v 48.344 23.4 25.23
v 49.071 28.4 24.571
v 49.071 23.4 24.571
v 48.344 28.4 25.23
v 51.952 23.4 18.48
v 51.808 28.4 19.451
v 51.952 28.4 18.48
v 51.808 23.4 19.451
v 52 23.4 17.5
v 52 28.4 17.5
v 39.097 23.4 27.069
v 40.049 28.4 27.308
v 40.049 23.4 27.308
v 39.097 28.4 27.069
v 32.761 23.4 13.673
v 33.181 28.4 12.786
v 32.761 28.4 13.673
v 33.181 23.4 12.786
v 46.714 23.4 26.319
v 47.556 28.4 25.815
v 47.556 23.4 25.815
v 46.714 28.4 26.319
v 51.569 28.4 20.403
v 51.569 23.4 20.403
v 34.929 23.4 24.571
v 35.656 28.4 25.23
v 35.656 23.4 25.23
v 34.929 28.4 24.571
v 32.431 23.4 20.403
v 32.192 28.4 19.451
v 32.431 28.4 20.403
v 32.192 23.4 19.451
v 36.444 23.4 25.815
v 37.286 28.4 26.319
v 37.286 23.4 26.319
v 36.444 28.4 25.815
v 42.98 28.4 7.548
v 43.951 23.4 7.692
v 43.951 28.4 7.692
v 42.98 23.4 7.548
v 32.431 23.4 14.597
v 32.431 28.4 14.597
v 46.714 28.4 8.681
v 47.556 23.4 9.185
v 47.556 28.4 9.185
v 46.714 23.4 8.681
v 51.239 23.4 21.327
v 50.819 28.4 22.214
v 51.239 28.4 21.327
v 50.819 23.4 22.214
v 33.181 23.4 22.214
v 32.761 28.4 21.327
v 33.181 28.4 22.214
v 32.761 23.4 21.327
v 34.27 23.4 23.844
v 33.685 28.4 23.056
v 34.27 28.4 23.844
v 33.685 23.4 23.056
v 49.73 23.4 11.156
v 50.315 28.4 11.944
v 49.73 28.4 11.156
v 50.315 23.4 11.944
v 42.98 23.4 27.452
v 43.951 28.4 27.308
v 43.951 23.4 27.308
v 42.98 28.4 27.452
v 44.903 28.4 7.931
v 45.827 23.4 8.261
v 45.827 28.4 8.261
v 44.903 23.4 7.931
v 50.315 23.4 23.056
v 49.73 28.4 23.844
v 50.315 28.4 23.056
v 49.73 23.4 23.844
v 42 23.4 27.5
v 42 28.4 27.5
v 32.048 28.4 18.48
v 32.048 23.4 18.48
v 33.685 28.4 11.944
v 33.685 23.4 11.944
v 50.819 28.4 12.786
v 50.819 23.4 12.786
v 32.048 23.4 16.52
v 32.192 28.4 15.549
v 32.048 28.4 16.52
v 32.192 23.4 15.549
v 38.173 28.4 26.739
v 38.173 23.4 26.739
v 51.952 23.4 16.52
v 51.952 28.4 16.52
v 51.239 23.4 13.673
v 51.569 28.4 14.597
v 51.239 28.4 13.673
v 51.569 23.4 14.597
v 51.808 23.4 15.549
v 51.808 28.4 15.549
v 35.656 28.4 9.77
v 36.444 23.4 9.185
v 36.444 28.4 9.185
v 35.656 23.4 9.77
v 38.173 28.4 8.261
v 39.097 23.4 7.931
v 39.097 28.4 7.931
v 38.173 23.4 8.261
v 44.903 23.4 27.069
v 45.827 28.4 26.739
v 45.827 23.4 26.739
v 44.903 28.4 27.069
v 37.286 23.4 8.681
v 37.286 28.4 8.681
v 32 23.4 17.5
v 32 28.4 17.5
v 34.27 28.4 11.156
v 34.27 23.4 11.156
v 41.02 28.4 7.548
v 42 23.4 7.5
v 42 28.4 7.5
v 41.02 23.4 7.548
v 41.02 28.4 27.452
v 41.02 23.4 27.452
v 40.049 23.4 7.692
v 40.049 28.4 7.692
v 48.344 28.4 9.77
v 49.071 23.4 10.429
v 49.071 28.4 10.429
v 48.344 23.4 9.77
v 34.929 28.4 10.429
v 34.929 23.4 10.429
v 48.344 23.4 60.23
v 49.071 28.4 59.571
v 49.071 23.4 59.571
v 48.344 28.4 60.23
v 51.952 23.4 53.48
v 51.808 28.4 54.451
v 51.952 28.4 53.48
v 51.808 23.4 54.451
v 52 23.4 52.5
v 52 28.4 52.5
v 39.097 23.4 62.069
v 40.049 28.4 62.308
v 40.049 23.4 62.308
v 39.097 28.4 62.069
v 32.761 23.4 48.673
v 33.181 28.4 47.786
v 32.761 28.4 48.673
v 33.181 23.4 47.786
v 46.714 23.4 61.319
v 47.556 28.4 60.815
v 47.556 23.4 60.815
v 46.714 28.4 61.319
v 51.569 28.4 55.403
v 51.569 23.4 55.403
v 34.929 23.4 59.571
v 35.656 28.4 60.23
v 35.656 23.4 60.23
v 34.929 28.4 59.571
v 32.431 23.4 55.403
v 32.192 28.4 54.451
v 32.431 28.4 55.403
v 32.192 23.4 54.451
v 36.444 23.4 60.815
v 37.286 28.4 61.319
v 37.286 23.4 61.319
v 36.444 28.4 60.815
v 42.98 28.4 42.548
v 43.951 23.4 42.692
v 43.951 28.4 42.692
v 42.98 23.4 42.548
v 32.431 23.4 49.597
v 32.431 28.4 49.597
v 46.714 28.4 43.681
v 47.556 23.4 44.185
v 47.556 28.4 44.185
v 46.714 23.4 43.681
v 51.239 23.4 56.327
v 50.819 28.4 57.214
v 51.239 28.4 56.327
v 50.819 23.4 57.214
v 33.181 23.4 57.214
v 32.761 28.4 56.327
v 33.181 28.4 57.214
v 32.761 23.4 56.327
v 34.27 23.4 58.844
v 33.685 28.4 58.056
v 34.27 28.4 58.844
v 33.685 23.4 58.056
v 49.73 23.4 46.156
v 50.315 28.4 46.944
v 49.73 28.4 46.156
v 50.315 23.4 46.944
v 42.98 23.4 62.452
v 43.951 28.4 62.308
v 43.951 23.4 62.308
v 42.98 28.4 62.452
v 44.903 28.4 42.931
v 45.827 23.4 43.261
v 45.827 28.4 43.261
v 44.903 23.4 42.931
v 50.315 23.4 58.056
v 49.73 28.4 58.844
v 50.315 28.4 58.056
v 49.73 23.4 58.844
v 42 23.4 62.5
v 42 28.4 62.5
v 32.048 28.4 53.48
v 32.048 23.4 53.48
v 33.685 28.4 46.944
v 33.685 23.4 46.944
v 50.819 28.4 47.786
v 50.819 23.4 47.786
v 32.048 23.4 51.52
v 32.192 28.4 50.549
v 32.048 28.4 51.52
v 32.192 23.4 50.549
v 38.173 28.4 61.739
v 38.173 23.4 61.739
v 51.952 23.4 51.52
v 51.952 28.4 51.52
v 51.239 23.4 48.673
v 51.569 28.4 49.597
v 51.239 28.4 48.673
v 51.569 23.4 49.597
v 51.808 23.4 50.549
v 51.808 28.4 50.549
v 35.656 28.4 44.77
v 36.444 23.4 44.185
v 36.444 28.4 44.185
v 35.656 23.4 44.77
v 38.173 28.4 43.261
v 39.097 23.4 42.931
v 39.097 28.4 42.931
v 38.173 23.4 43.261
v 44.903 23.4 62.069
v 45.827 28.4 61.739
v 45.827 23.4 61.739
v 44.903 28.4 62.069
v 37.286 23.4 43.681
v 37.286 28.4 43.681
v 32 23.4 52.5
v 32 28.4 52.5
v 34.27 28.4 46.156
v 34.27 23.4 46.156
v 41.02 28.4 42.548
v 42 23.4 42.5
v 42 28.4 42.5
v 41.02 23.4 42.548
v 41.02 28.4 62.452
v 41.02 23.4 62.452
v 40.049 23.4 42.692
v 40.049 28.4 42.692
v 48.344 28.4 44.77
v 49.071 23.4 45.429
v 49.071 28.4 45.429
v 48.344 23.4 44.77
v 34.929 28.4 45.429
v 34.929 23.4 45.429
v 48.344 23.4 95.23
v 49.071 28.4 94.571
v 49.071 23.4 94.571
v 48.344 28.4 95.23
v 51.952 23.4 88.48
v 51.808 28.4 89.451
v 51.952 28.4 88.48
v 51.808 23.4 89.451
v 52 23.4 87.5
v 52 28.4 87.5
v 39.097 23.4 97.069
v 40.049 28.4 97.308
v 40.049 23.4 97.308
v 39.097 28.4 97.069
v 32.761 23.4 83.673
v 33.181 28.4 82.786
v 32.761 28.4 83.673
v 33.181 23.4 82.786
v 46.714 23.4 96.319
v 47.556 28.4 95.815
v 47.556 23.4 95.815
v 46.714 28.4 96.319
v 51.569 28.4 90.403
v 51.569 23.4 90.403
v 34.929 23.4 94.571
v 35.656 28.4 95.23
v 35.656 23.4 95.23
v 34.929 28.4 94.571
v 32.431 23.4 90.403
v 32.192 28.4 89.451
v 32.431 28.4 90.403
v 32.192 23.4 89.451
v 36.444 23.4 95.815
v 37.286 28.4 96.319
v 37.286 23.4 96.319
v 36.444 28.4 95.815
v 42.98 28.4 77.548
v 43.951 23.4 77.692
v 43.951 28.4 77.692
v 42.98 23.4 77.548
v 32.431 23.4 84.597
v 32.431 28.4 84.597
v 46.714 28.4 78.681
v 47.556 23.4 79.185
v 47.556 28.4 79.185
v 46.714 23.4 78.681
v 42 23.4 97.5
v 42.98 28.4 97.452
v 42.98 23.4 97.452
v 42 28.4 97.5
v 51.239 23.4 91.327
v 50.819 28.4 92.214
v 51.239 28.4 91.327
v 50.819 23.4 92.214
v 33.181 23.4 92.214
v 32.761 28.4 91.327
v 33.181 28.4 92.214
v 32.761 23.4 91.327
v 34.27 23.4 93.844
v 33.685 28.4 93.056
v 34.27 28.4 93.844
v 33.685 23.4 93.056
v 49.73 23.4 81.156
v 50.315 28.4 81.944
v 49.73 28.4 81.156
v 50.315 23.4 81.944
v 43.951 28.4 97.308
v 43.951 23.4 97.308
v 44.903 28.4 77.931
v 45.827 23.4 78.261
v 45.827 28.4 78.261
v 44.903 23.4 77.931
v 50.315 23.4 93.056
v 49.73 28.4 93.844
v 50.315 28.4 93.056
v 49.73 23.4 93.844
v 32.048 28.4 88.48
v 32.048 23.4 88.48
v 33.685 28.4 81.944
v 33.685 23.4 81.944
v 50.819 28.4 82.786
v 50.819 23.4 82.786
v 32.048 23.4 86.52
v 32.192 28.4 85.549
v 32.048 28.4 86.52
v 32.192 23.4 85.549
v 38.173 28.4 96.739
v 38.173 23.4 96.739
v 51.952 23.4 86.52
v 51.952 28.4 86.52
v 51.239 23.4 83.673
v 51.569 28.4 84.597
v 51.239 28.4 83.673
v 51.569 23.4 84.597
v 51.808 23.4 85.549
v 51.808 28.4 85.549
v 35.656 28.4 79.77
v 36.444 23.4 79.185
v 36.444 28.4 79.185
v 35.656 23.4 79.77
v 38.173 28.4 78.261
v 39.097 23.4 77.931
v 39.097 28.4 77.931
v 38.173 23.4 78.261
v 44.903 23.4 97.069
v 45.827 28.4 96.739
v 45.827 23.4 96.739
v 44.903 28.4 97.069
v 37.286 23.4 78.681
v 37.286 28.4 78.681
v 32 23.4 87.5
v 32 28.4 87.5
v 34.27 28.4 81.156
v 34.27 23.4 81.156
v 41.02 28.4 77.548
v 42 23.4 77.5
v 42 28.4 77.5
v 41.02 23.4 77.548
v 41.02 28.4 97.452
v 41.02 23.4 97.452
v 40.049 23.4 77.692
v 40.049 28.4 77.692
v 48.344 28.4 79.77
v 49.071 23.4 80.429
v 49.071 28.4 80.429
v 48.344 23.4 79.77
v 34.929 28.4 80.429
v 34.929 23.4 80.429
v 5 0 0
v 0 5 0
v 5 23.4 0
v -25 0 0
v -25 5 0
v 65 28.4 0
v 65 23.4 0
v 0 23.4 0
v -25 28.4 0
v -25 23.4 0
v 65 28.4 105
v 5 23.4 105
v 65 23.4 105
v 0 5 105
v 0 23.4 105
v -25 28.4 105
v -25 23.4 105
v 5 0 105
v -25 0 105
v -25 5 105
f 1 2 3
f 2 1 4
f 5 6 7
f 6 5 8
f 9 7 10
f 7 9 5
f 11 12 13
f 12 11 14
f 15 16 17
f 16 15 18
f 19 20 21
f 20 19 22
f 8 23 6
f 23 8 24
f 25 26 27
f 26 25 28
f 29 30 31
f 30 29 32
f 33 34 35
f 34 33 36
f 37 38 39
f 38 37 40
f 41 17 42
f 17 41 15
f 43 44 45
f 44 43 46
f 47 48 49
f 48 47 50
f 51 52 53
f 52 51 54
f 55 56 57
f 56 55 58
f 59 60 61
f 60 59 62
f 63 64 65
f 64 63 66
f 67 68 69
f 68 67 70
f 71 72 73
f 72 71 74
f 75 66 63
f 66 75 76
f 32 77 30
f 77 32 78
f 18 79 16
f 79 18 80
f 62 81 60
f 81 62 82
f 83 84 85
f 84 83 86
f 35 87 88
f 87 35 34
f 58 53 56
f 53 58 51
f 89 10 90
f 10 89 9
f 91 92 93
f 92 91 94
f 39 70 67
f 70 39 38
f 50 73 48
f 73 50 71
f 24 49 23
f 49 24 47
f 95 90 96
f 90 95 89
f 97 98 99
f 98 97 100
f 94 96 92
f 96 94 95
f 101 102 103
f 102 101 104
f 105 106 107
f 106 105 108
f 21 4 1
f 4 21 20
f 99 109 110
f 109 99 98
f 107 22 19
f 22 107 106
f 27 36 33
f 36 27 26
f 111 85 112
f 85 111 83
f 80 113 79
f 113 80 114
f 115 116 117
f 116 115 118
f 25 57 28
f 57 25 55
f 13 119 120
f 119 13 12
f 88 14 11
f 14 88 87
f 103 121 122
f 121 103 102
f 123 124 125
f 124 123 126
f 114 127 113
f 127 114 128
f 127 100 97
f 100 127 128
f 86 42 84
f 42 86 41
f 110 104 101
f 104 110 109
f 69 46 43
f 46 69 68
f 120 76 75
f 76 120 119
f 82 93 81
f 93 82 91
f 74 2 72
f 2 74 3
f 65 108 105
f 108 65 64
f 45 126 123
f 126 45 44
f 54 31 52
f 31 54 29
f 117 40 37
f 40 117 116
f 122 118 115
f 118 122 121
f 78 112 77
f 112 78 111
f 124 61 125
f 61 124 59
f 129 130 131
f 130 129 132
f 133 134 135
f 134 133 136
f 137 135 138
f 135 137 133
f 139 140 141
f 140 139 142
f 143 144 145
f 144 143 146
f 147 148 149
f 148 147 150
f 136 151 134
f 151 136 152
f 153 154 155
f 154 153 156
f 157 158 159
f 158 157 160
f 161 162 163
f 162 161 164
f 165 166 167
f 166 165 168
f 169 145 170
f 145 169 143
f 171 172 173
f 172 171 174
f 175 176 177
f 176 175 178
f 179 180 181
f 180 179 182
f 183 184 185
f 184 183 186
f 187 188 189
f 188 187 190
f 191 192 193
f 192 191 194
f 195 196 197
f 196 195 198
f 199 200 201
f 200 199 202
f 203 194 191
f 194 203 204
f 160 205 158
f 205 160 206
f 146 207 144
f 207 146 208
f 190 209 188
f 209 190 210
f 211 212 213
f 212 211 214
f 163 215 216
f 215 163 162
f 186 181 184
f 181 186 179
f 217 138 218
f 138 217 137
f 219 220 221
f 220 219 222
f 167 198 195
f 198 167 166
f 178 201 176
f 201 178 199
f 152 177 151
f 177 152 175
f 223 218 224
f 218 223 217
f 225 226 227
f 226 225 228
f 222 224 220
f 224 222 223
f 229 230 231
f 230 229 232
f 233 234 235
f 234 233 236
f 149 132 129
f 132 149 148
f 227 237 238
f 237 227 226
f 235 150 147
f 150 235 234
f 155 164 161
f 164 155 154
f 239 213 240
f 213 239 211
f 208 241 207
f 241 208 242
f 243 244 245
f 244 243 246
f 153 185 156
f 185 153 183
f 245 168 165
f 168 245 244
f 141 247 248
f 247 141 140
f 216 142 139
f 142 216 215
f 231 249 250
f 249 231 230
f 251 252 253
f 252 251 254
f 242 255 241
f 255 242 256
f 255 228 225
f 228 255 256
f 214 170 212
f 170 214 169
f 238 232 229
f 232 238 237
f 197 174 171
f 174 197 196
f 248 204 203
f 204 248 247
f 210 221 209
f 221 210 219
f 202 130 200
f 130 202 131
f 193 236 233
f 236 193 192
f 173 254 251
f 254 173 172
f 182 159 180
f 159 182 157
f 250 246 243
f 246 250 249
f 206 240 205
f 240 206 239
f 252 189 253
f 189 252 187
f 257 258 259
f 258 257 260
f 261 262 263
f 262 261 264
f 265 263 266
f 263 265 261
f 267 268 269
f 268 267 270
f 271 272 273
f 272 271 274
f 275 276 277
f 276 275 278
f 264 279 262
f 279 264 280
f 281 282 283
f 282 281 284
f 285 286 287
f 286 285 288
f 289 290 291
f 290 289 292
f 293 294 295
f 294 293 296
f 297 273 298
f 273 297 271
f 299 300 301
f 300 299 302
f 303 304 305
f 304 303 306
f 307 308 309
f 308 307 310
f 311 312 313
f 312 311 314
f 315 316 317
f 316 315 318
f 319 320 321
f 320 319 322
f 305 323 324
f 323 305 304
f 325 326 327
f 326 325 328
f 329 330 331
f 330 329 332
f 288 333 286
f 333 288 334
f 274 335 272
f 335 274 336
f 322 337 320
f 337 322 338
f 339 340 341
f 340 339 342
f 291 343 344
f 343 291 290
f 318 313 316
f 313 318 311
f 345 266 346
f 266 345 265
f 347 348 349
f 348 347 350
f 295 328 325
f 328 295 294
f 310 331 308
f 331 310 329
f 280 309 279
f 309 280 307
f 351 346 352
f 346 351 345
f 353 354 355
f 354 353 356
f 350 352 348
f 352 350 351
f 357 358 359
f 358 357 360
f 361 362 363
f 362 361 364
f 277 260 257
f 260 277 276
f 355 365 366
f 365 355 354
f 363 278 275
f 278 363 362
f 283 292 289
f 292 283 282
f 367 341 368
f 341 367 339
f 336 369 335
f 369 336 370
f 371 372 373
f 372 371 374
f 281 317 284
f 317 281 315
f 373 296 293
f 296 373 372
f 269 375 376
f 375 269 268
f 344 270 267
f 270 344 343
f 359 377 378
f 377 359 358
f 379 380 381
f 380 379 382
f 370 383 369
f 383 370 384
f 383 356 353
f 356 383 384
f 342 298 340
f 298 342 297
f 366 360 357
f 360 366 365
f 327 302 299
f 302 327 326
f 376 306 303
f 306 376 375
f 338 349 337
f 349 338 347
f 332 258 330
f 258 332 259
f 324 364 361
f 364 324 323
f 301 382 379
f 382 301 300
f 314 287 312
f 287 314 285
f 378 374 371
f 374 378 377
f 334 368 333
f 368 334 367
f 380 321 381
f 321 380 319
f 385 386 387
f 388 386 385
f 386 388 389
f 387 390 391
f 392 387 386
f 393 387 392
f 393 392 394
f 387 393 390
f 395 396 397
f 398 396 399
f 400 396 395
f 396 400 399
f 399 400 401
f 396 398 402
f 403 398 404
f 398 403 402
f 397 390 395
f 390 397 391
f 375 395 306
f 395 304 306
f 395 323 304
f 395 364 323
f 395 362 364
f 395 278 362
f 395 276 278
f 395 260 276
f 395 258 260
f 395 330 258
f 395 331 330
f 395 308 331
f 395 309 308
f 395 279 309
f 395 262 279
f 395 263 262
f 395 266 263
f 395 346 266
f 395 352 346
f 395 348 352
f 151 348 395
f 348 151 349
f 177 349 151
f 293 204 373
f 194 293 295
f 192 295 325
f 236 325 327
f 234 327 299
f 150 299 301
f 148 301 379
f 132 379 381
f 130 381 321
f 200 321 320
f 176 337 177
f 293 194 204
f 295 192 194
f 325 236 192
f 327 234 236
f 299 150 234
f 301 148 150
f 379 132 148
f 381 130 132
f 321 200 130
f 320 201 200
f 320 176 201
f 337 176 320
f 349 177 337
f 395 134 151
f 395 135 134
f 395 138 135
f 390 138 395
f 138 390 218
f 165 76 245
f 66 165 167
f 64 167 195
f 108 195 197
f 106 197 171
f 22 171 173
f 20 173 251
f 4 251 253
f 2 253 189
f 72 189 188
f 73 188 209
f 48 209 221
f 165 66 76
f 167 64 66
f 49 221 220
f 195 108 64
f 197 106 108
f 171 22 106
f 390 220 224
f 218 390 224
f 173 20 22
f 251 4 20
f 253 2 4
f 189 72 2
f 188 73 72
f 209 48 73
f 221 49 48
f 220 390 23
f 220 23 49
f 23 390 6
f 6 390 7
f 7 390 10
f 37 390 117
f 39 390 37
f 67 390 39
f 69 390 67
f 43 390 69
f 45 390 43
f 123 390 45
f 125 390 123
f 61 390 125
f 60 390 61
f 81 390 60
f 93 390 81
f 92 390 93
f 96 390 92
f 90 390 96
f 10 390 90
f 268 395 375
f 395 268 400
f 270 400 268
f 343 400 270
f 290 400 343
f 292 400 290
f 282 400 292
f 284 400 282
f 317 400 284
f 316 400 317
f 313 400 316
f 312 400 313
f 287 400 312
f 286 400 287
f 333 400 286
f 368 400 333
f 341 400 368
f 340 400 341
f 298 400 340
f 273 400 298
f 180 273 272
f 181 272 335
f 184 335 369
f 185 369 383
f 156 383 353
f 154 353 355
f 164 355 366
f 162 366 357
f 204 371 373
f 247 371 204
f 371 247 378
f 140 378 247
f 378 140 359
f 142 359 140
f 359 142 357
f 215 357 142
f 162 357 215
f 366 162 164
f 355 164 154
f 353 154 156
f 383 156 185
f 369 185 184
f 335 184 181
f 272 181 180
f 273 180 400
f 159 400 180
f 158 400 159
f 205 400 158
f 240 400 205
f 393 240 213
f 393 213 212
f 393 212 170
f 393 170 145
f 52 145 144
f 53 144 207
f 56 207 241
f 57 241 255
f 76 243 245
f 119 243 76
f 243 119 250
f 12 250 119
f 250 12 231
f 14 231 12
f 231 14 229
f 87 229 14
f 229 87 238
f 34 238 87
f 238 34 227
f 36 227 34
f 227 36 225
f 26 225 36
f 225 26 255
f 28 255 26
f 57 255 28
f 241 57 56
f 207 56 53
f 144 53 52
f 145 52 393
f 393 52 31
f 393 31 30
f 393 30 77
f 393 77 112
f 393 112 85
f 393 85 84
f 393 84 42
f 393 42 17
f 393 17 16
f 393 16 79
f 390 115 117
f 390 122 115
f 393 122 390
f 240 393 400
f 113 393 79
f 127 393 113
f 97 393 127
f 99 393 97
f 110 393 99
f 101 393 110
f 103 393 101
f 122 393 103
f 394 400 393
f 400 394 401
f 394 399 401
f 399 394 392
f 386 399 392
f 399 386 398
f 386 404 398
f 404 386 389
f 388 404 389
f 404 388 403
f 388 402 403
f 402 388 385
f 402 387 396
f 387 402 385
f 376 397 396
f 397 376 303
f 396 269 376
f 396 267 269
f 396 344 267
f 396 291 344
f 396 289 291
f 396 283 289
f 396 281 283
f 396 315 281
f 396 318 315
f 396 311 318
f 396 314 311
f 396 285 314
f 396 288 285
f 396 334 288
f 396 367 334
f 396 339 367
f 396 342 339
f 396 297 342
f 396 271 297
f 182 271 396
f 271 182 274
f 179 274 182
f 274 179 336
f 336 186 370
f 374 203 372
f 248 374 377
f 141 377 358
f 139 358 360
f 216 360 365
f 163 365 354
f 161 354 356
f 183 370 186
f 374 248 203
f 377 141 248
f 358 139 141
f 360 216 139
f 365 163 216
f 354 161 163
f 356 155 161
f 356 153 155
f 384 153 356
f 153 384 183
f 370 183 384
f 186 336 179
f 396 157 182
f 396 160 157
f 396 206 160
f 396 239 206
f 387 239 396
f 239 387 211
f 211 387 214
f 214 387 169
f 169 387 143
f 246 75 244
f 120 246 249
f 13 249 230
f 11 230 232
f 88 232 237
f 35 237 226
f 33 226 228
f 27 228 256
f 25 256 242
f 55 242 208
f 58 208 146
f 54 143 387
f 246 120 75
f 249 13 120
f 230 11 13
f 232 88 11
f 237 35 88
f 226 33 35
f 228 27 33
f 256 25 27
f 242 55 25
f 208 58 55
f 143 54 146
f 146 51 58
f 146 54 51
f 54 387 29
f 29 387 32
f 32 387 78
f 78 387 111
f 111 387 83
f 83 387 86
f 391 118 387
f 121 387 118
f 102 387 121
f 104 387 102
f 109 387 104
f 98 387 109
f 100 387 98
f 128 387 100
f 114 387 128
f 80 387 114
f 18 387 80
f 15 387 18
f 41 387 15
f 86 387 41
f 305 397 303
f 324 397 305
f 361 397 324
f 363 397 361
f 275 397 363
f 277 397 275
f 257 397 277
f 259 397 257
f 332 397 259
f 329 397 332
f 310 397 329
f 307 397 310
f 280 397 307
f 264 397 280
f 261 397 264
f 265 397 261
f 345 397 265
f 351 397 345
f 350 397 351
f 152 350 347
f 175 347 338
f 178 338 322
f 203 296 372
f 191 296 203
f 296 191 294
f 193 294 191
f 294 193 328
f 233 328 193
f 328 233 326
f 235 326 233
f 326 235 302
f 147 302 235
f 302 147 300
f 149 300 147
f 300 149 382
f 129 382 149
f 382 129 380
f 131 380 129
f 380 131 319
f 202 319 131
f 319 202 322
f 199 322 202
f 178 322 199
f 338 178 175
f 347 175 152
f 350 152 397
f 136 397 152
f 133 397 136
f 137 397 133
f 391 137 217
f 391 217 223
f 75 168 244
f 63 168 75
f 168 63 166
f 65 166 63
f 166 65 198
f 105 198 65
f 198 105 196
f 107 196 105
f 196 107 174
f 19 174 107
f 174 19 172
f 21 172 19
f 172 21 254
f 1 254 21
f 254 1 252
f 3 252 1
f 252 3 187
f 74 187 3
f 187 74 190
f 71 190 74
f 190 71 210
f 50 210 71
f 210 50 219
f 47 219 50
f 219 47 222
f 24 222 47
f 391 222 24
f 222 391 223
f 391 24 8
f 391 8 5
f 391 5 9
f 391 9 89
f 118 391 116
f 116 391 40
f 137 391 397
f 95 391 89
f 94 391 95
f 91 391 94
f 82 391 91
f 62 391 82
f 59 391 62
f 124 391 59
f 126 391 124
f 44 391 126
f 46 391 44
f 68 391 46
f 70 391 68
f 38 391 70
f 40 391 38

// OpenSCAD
// Dimensions (mm)
shelf_thickness = 18;
extrusion_length = 105;

// Profile dimensions
spine_x_start = 0;
spine_x_end = 5;
spine_y_start = 0;
spine_y_end = 28.4;

bottom_jaw_x_start = -25;
bottom_jaw_x_end = 5;
bottom_jaw_y_start = 0;
bottom_jaw_y_end = 5;

top_jaw_arm_x_start = -25;
top_jaw_arm_x_end = 65;
top_jaw_arm_y_start = 23.4;
top_jaw_arm_y_end = 28.4;

// Hole parameters
hole_diameter = 20;
hole_radius = hole_diameter / 2;
hole_x = 42;
hole_z_positions = [17.5, 52.5, 87.5];

// Quality
$fn = 64;

// Build the part
difference() {
    // Extrude the C-shaped profile along Z
    linear_extrude(height = extrusion_length, convexity = 10) {
        union() {
            // Spine
            translate([spine_x_start, spine_y_start])
                square([spine_x_end - spine_x_start, spine_y_end - spine_y_start]);

            // Bottom jaw
            translate([bottom_jaw_x_start, bottom_jaw_y_start])
                square([bottom_jaw_x_end - bottom_jaw_x_start, bottom_jaw_y_end - bottom_jaw_y_start]);

            // Top jaw and arm
            translate([top_jaw_arm_x_start, top_jaw_arm_y_start])
                square([top_jaw_arm_x_end - top_jaw_arm_x_start, top_jaw_arm_y_end - top_jaw_arm_y_start]);
        }
    }

    // Cut holes through the arm along Z
    // The holes are centred at specific Z positions and go through the Y-axis of the profile.
    // Since the profile is in XY and extruded along Z, a hole "along Y" means the cylinder axis is Y.
    // However, the prompt says "Three round 20 mm holes go through the arm along Y (vertically in use)".
    // In the print orientation (lying on side), +Y is up. So the holes are vertical in the print orientation.
    // This means the cylinder axis is Y.
    // The holes are centred at x = 42 and z = 17.5, 52.5, 87.5.
    // The Y position of the hole centre needs to be within the arm's Y range (23.4 to 28.4).
    // Let's centre the holes in the Y-thickness of the arm: (23.4 + 28.4) / 2 = 25.9.
    
    for (z_pos = hole_z_positions) {
        translate([hole_x, 25.9, z_pos])
            rotate([90, 0, 0]) // Rotate cylinder so its axis (Z) aligns with Y
            cylinder(h = extrusion_length + 2, r = hole_radius, center = true, $fn = 64);
    }
}
